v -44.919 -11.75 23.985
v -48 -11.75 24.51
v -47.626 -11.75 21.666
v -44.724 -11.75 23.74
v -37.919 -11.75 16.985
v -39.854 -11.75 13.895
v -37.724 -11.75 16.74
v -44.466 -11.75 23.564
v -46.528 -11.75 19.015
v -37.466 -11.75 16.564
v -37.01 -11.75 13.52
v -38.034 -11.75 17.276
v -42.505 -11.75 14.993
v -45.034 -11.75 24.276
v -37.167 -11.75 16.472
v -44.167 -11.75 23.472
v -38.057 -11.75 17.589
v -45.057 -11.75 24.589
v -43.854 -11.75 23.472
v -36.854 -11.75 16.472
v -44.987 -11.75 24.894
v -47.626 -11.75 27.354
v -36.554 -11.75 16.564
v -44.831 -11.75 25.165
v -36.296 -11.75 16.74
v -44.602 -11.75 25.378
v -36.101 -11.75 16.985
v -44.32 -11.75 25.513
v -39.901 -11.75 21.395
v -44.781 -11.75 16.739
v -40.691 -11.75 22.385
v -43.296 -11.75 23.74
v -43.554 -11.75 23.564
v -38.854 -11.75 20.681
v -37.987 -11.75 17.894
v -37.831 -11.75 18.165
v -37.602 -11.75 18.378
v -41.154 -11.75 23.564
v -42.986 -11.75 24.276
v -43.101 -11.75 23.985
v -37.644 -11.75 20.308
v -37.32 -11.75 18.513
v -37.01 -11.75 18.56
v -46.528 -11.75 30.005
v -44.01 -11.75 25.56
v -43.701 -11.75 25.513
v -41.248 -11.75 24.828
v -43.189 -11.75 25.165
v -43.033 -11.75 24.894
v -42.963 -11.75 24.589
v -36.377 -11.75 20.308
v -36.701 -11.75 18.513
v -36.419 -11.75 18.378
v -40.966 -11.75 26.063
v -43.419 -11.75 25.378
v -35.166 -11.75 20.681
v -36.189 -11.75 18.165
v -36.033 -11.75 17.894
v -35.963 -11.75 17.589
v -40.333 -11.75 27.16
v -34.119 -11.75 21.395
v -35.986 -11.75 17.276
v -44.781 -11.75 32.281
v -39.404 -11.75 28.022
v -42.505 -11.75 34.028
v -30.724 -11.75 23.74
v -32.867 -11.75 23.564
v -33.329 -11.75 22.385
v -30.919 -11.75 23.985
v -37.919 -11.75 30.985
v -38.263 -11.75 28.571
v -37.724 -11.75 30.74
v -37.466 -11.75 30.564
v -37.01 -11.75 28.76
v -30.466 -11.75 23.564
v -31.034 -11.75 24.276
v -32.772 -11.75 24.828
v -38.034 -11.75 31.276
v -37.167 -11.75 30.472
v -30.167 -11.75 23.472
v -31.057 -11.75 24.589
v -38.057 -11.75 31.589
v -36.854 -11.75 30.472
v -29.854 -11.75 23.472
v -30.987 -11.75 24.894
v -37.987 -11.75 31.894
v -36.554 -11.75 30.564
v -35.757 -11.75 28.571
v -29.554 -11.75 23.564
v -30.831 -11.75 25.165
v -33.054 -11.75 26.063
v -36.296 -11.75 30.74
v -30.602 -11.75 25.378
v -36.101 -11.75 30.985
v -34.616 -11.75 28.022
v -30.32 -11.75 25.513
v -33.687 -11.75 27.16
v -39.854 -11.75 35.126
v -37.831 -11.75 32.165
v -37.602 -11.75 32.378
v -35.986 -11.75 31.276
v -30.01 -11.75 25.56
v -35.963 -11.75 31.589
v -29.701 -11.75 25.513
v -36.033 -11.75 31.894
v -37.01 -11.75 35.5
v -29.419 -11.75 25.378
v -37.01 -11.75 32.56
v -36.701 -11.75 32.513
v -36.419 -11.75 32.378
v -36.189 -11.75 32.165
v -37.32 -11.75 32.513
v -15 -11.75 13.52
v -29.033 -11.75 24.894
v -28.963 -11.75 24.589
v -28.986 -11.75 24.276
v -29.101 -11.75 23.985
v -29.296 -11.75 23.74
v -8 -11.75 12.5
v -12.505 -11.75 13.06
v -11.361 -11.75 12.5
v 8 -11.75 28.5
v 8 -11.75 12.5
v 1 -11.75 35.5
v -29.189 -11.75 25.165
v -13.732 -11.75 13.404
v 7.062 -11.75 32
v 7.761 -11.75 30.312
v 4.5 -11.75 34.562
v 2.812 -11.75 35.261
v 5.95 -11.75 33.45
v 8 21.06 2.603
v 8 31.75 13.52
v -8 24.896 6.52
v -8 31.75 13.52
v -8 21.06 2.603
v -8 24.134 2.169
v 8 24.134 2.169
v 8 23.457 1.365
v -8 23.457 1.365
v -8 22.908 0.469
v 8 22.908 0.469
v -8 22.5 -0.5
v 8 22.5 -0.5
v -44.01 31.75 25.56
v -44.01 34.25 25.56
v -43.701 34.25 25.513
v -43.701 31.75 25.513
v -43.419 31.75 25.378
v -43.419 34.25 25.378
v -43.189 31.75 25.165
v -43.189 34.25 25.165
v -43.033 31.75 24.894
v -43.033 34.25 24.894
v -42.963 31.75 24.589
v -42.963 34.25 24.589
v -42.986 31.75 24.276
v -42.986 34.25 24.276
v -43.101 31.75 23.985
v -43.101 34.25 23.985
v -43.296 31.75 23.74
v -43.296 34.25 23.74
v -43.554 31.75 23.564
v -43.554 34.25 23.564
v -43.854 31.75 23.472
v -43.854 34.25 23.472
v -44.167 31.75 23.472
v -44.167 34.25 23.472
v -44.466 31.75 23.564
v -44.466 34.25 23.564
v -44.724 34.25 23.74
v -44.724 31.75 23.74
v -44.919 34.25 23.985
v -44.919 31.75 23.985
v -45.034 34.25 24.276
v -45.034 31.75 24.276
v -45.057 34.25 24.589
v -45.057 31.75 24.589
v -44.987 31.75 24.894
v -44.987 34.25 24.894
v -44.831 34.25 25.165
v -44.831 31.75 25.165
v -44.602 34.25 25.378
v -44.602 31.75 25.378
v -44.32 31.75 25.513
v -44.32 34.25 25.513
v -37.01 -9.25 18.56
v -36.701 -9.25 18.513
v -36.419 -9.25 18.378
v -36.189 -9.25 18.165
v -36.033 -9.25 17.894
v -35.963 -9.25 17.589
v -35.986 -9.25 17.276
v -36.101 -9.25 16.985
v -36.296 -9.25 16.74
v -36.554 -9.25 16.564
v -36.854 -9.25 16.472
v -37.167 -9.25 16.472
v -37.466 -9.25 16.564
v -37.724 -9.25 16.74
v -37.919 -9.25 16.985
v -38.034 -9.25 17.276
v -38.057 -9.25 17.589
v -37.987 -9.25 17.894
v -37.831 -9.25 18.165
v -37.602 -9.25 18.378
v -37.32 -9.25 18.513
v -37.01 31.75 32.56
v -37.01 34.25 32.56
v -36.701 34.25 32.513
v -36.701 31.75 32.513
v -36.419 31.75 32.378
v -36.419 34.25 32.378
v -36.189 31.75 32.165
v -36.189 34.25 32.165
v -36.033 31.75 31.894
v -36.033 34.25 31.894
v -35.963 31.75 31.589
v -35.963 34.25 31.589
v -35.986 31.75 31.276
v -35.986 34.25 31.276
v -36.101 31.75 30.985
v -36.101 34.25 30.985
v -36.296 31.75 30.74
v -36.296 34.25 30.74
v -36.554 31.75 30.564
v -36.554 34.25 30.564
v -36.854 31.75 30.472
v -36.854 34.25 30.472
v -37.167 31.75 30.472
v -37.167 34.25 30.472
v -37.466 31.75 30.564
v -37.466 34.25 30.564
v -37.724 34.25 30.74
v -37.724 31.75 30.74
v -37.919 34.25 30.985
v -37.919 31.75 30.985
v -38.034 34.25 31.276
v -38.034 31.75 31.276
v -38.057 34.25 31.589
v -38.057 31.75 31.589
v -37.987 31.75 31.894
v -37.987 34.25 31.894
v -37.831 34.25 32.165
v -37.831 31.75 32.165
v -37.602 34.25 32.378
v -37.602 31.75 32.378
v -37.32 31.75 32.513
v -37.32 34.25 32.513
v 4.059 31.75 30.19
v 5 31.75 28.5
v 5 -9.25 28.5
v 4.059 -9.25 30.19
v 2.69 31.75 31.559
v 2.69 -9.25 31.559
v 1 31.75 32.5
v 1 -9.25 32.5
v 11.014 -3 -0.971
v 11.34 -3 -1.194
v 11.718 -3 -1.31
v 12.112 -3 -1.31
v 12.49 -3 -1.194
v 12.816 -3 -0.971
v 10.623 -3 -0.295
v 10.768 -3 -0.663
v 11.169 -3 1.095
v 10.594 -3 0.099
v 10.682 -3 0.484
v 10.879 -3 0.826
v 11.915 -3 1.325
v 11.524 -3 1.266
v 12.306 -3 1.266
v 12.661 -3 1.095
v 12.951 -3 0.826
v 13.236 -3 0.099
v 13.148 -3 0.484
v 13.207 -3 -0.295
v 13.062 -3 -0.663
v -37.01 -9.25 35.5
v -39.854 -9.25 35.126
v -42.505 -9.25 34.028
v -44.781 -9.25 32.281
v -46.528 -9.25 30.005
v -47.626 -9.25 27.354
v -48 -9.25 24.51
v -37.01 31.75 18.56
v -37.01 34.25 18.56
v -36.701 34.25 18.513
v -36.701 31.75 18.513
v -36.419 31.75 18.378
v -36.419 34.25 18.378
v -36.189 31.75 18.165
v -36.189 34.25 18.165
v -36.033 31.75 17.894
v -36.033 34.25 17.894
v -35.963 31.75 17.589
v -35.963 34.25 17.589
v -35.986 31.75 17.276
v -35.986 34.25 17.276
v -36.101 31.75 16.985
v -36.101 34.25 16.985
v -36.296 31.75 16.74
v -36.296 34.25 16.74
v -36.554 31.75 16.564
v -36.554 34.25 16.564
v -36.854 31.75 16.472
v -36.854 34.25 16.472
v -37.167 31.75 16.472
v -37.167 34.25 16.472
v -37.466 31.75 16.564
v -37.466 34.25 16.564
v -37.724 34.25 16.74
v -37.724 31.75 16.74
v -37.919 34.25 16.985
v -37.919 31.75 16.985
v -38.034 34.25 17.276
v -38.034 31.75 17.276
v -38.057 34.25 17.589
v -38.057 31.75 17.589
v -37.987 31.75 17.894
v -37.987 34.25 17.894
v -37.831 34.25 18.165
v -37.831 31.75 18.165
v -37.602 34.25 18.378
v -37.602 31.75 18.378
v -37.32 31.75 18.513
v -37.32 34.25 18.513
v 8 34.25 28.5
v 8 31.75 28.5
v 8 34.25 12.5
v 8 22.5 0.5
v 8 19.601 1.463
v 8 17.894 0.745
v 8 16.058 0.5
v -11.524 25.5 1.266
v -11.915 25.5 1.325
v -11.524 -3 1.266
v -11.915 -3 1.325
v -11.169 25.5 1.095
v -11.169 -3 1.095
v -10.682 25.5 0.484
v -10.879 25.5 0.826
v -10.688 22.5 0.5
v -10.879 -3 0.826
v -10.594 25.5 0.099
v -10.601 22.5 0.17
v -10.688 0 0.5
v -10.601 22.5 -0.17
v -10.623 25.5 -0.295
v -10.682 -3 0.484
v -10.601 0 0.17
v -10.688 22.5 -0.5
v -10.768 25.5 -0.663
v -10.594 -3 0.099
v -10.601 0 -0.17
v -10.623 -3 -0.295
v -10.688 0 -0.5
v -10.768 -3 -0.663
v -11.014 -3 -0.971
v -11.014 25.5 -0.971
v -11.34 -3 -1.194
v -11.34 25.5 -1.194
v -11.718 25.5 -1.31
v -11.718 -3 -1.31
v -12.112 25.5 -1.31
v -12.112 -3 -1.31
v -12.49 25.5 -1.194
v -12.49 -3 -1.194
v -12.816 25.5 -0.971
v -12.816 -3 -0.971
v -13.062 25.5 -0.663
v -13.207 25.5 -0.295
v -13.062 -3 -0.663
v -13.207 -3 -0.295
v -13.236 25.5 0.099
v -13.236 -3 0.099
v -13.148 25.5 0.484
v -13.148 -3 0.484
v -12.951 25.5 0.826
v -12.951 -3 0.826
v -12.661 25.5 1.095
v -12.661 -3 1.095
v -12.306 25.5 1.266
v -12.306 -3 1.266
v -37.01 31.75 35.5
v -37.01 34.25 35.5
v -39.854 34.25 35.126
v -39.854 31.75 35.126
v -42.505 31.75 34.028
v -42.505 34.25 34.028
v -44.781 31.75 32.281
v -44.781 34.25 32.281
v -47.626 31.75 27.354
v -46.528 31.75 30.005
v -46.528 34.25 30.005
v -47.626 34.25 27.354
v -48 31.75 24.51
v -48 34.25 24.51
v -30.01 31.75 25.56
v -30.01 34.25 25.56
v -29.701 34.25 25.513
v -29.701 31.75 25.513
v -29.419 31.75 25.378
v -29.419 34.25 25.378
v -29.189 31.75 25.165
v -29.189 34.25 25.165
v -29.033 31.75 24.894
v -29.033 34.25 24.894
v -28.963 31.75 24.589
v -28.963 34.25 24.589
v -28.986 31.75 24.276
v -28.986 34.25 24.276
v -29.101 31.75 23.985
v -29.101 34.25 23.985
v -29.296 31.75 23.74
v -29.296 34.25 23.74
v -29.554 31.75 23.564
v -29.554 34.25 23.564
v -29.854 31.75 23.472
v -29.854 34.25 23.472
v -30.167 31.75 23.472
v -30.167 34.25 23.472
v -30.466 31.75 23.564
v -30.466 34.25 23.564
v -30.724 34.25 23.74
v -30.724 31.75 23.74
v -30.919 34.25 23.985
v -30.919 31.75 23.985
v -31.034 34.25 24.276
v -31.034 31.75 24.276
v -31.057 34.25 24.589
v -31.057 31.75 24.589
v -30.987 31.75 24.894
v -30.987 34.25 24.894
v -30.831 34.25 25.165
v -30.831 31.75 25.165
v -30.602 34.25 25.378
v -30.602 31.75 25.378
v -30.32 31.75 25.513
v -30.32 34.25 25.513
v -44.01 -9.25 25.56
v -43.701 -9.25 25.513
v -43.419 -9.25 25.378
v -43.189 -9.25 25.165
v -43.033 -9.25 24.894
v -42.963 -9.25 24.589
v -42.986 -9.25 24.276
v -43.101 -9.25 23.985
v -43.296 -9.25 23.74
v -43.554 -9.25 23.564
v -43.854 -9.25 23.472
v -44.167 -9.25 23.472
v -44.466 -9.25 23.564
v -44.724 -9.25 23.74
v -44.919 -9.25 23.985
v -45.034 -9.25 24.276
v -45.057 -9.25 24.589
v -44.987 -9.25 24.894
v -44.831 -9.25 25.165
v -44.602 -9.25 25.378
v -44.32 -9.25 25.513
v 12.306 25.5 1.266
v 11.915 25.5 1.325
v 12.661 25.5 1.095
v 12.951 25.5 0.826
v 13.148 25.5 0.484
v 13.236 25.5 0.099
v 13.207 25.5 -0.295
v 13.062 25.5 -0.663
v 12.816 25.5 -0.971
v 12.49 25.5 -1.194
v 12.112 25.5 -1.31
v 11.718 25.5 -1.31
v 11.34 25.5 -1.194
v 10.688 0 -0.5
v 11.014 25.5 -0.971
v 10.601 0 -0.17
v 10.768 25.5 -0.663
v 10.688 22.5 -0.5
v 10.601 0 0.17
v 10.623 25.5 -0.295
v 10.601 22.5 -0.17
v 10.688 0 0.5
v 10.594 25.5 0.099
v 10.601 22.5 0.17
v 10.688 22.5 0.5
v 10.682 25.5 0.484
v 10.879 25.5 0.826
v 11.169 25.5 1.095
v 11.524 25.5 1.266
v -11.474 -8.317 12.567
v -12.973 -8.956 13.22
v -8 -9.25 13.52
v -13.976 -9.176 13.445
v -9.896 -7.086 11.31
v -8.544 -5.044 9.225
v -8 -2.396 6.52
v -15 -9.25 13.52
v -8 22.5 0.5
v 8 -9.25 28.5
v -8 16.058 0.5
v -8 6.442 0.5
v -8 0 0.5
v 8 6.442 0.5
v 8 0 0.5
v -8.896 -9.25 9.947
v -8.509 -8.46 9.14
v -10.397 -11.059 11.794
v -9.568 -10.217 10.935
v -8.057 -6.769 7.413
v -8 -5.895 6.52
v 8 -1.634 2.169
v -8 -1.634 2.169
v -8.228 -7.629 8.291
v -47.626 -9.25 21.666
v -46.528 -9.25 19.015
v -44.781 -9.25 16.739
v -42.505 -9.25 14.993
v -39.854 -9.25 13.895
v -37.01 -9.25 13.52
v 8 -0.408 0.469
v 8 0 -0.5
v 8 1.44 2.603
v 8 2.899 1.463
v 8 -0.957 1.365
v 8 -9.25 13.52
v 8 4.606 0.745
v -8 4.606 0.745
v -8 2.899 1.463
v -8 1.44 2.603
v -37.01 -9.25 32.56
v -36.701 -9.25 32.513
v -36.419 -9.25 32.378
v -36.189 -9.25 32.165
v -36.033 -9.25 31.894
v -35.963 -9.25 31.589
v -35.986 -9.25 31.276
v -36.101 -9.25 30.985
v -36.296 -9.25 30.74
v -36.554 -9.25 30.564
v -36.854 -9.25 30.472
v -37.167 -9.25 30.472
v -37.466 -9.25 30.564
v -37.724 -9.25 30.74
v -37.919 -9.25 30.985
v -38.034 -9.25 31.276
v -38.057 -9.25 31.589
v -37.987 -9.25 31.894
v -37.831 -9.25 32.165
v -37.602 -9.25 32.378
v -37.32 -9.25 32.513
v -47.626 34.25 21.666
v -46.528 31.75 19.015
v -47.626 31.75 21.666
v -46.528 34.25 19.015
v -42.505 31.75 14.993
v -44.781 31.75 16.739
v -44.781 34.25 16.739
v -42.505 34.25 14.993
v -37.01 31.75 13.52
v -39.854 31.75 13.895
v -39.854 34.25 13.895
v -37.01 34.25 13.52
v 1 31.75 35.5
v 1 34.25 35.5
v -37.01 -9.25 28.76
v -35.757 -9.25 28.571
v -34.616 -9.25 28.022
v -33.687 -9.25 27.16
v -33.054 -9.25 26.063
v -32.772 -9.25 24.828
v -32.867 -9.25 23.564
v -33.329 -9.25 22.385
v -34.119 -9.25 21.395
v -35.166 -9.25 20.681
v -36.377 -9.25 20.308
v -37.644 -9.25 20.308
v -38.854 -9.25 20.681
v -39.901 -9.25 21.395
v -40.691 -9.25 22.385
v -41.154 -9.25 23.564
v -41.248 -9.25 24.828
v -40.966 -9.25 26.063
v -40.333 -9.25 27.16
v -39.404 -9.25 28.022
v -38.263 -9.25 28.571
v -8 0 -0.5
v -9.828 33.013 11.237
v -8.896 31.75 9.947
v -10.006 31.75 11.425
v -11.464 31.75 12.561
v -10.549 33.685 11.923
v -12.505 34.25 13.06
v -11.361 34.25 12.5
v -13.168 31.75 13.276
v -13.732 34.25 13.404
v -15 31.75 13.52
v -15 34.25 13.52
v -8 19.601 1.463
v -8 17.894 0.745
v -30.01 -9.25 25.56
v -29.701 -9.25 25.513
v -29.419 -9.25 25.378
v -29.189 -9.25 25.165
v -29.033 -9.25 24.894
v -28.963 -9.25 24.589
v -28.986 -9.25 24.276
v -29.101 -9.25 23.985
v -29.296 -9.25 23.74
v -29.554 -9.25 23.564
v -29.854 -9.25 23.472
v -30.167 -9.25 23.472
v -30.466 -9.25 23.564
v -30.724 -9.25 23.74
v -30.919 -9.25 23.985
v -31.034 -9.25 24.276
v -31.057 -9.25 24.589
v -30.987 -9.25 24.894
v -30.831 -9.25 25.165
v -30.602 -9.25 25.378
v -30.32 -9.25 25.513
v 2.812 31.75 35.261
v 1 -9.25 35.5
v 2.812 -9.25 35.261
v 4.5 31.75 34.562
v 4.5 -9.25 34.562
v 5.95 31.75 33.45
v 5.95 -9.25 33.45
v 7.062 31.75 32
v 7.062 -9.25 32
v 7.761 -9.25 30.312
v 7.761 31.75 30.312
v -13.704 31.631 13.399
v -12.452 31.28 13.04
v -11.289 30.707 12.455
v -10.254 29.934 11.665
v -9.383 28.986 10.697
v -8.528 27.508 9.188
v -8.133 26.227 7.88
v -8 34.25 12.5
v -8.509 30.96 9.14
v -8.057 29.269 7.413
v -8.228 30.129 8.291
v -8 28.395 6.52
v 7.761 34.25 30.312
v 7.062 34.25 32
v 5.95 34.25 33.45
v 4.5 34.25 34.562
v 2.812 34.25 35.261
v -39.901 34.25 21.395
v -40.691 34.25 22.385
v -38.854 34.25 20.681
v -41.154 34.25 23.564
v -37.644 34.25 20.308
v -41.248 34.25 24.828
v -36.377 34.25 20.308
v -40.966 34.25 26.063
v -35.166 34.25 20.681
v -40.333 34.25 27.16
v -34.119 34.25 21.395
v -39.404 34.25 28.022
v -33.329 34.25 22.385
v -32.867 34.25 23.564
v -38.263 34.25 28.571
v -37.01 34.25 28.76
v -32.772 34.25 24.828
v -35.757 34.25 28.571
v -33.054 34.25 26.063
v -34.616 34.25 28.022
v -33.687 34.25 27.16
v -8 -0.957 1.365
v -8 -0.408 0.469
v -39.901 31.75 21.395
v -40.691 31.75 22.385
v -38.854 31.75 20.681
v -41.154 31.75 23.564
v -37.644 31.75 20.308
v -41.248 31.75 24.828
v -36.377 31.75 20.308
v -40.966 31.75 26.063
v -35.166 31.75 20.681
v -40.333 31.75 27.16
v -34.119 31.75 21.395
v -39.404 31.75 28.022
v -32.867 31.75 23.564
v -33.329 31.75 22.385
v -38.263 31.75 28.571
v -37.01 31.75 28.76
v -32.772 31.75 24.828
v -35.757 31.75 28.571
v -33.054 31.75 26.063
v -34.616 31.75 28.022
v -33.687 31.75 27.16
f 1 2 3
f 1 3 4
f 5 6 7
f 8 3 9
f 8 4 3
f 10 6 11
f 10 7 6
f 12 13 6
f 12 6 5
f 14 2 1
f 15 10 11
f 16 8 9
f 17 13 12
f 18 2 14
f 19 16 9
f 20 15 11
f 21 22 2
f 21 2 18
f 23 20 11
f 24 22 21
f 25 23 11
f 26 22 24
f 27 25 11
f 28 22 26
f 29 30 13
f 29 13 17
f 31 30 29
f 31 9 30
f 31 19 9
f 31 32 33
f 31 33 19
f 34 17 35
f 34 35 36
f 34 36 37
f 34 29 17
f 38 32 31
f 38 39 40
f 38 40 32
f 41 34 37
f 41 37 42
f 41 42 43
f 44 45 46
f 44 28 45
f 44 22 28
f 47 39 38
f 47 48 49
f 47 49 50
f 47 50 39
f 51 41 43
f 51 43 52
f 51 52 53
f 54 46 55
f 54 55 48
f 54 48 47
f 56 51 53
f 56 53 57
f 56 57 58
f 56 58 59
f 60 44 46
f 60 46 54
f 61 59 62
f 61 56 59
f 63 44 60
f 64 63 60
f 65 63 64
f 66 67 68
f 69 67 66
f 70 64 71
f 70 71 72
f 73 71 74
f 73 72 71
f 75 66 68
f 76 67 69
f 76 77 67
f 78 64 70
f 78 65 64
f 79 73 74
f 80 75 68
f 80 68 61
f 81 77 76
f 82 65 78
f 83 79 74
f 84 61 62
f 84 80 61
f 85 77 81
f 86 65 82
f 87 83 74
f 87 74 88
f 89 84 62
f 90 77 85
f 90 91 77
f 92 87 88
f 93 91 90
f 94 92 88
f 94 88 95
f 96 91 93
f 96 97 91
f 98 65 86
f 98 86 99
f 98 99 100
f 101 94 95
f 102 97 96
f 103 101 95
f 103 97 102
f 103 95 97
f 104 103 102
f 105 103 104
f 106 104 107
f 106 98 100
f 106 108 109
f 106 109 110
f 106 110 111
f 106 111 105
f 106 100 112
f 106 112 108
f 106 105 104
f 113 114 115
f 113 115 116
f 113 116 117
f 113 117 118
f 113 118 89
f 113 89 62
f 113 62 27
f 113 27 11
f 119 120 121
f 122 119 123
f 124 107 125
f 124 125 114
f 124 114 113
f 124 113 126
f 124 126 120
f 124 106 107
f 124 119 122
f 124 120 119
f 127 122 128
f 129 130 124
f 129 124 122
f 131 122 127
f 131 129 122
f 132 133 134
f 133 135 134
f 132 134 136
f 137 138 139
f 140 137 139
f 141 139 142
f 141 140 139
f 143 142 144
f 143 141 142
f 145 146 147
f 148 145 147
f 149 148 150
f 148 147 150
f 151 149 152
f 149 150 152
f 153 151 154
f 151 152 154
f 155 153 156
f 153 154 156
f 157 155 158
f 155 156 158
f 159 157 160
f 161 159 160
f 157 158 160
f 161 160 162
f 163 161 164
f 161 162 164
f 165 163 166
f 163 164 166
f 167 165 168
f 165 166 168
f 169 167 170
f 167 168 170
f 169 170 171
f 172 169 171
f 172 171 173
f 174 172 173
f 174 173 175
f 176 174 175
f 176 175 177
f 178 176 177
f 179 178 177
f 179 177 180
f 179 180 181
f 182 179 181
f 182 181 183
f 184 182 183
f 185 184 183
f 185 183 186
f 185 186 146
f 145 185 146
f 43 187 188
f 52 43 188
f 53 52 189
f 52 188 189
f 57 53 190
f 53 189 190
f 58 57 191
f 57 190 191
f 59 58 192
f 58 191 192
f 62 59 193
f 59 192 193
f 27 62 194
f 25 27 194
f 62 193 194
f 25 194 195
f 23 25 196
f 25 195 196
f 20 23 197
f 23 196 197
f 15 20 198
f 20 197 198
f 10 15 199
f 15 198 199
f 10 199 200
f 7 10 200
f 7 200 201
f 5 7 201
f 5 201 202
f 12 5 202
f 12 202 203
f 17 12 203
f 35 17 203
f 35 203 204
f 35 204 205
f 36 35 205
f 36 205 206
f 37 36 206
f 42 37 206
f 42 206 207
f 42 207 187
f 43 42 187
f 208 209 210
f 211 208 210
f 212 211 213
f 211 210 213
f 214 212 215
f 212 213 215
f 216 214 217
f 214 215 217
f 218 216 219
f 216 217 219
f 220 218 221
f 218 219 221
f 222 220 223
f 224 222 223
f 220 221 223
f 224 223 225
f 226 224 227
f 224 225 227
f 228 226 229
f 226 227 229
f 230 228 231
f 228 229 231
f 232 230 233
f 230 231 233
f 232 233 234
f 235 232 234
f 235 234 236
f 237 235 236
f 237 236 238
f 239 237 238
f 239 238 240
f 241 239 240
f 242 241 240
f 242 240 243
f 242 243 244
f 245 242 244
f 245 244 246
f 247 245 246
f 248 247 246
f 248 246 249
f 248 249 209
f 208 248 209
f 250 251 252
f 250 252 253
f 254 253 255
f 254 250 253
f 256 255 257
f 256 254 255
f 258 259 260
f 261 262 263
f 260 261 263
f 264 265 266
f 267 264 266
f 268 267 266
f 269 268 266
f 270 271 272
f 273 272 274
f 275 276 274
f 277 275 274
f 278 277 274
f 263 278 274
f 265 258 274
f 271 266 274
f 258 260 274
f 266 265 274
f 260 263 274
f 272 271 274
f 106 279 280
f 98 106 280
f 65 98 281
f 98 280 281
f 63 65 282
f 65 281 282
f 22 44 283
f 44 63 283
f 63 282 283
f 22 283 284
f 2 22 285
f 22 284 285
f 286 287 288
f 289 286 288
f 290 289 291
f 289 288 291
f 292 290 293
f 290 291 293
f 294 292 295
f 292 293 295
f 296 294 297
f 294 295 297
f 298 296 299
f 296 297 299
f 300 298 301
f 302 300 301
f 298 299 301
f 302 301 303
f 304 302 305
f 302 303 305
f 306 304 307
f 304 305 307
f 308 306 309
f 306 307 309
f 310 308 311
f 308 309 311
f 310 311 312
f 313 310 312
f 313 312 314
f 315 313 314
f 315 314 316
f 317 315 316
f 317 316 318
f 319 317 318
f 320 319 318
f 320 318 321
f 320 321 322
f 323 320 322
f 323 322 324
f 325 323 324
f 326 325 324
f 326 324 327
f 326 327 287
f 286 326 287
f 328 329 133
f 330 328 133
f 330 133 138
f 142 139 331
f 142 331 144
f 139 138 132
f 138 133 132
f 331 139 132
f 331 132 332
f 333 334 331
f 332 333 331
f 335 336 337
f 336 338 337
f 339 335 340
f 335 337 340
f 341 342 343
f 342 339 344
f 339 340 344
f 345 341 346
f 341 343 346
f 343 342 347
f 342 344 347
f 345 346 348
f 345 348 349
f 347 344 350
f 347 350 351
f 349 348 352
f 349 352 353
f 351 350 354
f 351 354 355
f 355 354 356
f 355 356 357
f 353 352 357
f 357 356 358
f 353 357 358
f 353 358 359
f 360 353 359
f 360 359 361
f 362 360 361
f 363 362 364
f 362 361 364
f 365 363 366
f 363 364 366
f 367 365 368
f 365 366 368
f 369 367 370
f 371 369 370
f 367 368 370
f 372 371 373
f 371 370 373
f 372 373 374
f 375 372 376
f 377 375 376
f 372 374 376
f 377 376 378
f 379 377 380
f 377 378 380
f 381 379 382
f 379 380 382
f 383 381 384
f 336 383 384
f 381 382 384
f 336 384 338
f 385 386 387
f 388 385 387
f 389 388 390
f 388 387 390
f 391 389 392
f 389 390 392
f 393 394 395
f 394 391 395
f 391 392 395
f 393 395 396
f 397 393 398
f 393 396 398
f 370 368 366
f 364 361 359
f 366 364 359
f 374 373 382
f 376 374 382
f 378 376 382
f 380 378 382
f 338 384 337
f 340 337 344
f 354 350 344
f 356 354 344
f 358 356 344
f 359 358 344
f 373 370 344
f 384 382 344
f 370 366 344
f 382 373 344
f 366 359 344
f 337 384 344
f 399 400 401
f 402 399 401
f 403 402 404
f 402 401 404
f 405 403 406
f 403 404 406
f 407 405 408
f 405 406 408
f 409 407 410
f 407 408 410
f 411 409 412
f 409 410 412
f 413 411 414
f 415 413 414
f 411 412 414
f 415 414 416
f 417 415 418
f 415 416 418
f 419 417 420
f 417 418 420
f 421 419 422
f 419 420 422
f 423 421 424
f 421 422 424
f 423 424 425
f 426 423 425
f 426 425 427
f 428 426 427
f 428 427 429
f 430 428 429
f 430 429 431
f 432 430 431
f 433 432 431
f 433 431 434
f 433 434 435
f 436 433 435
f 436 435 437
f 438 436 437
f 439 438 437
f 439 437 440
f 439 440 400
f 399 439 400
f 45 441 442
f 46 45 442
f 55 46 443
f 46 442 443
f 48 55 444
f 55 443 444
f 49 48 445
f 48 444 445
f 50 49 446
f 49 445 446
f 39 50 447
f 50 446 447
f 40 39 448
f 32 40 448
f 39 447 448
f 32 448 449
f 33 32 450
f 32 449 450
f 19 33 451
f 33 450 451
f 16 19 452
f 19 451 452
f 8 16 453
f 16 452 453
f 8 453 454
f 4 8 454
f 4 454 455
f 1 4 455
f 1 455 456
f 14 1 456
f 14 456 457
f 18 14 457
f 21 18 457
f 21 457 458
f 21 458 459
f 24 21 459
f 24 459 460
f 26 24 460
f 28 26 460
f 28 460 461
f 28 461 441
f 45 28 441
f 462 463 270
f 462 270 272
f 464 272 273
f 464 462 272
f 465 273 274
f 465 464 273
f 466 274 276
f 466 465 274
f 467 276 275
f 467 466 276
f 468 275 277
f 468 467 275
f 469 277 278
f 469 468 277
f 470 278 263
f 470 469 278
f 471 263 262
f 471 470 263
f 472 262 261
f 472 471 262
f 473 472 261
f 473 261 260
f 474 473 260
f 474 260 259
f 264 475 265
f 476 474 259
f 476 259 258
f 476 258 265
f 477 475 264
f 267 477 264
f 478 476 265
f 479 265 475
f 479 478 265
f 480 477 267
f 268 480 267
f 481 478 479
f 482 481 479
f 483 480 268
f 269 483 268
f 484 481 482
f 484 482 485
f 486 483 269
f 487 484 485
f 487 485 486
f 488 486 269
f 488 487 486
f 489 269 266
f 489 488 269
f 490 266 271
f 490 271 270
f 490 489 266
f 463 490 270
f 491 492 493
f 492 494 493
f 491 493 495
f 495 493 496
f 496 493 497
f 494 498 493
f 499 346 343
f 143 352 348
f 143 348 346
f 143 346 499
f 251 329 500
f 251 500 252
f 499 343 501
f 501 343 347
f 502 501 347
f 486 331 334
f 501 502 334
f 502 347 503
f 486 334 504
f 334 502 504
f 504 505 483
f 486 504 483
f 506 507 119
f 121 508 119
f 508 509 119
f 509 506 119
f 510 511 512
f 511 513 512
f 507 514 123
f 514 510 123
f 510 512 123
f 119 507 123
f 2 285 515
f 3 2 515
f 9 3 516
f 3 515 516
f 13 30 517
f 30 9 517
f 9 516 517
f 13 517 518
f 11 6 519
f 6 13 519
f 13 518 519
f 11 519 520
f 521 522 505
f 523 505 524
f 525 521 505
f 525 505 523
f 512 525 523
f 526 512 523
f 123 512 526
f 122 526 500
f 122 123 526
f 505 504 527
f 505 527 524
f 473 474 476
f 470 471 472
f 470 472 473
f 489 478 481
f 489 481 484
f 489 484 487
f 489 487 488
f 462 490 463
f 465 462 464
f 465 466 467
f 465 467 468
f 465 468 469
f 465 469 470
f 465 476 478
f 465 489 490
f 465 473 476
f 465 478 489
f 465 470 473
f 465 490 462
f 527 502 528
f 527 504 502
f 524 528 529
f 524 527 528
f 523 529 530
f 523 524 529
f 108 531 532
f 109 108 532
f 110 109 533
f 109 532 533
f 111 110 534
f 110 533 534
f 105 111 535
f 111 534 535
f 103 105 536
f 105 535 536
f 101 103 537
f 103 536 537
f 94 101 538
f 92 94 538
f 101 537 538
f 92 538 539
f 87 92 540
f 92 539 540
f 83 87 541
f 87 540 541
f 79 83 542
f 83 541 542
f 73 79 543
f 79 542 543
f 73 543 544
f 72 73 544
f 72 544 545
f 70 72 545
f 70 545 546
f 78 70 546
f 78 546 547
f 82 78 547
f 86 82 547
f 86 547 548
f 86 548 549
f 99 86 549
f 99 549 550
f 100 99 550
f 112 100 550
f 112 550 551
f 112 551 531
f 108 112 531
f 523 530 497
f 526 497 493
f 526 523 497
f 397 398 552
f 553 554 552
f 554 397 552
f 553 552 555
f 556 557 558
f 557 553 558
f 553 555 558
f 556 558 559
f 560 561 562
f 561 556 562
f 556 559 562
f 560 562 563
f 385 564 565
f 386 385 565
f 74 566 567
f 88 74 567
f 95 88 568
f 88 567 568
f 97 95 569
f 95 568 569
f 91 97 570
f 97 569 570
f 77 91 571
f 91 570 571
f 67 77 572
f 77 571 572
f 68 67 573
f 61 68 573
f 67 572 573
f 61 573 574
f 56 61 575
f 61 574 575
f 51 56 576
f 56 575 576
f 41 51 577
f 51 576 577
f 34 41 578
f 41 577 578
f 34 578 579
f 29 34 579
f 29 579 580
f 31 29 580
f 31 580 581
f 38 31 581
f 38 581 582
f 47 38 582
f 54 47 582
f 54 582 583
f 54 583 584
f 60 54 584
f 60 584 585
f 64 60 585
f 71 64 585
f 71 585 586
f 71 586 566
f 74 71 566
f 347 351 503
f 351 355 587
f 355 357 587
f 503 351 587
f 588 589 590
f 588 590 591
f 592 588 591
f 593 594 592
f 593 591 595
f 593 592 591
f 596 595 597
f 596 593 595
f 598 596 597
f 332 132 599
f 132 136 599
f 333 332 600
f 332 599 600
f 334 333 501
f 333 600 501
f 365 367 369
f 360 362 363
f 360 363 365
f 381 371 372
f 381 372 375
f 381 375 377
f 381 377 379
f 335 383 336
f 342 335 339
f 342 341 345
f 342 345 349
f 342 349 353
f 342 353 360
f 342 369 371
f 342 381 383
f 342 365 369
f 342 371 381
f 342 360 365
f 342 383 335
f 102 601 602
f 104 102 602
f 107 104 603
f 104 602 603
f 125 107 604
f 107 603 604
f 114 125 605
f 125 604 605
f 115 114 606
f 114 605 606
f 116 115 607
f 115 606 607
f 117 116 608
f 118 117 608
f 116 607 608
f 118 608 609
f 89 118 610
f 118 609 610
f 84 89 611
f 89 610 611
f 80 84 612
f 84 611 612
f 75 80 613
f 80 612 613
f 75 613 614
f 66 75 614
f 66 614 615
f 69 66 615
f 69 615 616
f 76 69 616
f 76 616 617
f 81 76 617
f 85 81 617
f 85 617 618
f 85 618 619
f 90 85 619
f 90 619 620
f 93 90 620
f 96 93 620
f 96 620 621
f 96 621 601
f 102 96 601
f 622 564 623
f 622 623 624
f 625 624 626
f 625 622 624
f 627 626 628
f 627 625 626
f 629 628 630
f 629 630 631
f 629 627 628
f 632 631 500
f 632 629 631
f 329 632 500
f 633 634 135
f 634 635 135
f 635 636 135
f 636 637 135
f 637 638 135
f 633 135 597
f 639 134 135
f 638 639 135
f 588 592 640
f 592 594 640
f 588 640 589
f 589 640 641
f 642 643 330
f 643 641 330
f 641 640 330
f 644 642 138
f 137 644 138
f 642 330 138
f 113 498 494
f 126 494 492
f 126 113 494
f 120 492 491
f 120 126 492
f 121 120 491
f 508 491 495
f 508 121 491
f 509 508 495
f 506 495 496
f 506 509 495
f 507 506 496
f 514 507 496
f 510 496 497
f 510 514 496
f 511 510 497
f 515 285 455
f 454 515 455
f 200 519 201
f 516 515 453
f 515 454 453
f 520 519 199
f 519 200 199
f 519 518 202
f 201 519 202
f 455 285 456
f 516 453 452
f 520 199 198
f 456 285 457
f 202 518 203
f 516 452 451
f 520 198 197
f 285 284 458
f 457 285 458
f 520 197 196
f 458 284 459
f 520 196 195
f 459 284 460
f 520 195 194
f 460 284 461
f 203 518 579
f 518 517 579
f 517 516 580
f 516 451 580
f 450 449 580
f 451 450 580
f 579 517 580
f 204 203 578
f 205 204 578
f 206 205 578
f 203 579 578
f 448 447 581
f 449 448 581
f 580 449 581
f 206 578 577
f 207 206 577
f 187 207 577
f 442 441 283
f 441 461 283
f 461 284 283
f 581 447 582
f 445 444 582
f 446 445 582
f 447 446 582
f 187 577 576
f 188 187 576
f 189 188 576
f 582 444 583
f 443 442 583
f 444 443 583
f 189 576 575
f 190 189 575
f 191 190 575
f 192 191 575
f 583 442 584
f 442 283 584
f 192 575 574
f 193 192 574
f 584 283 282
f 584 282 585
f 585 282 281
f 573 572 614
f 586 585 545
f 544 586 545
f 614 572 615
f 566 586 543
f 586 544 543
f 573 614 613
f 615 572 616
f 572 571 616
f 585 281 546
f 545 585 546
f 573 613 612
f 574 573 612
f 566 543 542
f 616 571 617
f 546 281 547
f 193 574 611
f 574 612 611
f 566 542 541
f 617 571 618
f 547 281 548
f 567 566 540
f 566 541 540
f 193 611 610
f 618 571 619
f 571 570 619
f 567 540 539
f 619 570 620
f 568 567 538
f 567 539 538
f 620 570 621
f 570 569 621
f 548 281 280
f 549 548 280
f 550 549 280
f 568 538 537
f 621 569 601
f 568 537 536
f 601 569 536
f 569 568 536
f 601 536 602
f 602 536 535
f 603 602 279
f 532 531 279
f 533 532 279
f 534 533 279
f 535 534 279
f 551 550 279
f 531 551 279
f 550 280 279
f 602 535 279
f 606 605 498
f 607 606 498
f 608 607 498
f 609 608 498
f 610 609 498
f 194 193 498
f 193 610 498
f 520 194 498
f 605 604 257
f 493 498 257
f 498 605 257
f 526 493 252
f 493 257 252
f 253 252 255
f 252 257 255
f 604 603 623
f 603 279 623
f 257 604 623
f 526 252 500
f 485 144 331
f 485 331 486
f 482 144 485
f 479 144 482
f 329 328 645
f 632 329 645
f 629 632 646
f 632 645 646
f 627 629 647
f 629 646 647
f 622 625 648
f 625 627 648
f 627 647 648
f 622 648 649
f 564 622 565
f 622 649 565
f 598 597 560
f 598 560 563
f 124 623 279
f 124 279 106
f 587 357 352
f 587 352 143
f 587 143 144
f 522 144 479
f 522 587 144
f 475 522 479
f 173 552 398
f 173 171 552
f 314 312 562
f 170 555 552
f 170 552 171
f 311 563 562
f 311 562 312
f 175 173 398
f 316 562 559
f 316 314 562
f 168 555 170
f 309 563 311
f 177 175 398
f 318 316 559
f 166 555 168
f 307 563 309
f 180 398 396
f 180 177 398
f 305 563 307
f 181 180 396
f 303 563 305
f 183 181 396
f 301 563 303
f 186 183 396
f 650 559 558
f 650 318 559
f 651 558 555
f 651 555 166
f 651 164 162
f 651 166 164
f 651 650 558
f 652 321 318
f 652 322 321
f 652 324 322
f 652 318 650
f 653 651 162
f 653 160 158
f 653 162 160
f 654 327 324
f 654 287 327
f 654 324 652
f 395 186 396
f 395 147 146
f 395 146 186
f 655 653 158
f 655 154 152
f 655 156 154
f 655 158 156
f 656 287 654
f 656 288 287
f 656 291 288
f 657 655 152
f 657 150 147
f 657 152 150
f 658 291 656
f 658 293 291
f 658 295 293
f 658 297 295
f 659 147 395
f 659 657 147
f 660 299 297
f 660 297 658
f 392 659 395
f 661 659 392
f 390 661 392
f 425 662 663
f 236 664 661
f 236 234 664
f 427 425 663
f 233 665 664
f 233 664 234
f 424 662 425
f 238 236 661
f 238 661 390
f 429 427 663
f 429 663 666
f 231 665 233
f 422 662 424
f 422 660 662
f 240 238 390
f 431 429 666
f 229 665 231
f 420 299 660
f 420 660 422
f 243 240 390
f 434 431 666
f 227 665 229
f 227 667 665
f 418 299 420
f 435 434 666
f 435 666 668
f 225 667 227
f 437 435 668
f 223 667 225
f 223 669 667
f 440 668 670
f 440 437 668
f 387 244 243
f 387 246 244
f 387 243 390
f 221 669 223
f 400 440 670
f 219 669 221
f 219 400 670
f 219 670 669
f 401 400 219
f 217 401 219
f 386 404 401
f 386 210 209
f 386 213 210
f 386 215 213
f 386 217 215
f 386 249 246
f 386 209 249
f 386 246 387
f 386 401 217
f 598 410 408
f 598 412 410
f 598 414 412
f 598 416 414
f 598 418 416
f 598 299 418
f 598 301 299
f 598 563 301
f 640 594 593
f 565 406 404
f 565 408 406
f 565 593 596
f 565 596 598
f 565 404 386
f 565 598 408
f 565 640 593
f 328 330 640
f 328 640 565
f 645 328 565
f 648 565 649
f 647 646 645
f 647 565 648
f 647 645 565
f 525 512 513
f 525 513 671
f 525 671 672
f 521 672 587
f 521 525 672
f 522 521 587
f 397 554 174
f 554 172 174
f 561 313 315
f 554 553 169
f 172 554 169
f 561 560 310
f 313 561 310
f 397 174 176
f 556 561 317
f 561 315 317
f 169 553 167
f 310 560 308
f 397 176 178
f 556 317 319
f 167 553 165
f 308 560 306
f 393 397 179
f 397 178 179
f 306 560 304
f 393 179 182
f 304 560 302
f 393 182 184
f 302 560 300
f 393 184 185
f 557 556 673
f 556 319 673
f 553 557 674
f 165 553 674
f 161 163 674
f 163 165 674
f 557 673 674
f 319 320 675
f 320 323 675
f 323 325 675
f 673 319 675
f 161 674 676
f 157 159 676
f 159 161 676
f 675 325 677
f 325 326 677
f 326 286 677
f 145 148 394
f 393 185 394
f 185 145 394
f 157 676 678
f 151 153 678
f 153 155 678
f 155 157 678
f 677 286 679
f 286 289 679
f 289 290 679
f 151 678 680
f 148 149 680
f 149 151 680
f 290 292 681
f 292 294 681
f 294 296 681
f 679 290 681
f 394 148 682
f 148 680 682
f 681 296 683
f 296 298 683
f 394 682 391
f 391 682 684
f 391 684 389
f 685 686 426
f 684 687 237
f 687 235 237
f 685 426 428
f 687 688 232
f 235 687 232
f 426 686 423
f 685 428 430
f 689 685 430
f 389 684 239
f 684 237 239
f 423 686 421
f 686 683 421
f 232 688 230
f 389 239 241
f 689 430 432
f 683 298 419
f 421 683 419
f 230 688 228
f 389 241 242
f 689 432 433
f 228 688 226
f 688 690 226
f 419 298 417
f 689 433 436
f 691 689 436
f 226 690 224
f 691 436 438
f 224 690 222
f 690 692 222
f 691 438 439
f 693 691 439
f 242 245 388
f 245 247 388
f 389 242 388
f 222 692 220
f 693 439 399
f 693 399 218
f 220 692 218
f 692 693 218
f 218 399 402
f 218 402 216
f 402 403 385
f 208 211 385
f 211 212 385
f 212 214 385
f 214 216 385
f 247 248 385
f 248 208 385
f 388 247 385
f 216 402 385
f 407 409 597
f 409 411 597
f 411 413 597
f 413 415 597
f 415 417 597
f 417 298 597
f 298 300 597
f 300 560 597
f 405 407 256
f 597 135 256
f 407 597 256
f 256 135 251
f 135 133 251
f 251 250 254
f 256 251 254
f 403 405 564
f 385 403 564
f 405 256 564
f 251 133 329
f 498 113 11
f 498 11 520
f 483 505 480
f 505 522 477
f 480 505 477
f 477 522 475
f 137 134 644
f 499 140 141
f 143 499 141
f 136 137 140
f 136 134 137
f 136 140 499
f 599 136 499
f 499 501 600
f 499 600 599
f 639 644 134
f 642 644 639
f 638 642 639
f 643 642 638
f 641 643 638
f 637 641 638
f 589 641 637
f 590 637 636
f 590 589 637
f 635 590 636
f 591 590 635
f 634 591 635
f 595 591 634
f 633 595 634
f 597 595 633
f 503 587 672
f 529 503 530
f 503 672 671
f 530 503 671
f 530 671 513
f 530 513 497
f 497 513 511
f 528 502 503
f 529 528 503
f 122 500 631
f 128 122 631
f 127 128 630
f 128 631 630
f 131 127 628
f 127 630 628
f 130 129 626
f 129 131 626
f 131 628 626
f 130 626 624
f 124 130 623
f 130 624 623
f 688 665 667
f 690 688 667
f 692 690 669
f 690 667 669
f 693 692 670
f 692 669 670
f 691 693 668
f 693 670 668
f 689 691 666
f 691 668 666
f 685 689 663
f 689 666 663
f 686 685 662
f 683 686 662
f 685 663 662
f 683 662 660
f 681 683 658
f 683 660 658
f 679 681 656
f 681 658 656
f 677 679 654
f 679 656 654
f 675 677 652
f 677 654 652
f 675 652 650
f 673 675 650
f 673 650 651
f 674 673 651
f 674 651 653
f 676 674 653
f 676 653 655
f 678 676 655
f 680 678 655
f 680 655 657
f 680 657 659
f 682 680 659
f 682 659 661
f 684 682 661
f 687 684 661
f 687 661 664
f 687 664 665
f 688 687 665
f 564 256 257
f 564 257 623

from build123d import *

# Parameters (mm, degrees)
SKETCH1_W           = 23.83
SKETCH1_H           = 1
BOSS_EXTRUDE1_DEPTH = 22.5
SKETCH2_R           = 1.325
BOSS_EXTRUDE2_DEPTH = 14.25
BOSS_EXTRUDE4_DEPTH = 8
SKETCH5_W           = 21.979847568
SKETCH5_H           = 2.5
BOSS_EXTRUDE5_DEPTH = 40
SKETCH6_R           = 4.25
SKETCH6_R_2         = 1.05
CUT_EXTRUDE1_DEPTH  = 76.367433285
FILLET1_R           = 7
FILLET2_R           = 7
FILLET3_R           = 7
BOSS_EXTRUDE6_START = 41
BOSS_EXTRUDE6_DEPTH = 41


with BuildPart() as part:
    # Sketch1 → Boss-Extrude1 (new body)
    with BuildSketch(Plane(origin=(0, 0, 0), x_dir=(1, 0, 0), z_dir=(0, 1, 0))):
        Rectangle(SKETCH1_W, SKETCH1_H)
    extrude(amount=BOSS_EXTRUDE1_DEPTH)

    # Sketch2 → Boss-Extrude2 (add, symmetric)
    with BuildSketch(Plane(origin=(0, 11.25, 0), x_dir=(1, 0, 0), z_dir=(0, 1, 0))):
        with Locations(Location((-11.915, 0, 0), (0, 0, 270))):
            Circle(SKETCH2_R)
        with Locations(Location((11.915, 0, 0), (0, 0, 270))):
            Circle(SKETCH2_R)
    extrude(amount=BOSS_EXTRUDE2_DEPTH, both=True)

    # Sketch4 → Boss-Extrude4 (add, symmetric)
    with BuildSketch(Plane(origin=(0, 0, 0), x_dir=(0, 0, -1), z_dir=(1, 0, 0))):
        Polygon((-0.5, 19.001100744), (-0.5, 22.5), (-12.5, 34.25), (-35.5, 34.25), (-35.5, 31.75), (-13.520152432, 31.75), align=None)
        Polygon((-0.5, 0), (-0.5, 3.498899256), (-13.520152432, -9.25), (-35.5, -9.25), (-35.5, -11.75), (-12.5, -11.75), align=None)
    extrude(amount=BOSS_EXTRUDE4_DEPTH, both=True)

    # Sketch5 → Boss-Extrude5 (add)
    with BuildSketch(Plane.ZY.offset(8)):
        with Locations((24.510076216, 33)):
            Rectangle(SKETCH5_W, SKETCH5_H)
        with Locations((24.510076216, -10.5)):
            Rectangle(SKETCH5_W, SKETCH5_H)
    extrude(amount=BOSS_EXTRUDE5_DEPTH)

    # Sketch6 → Cut-Extrude1 (cut, through all)
    with BuildSketch(Plane(origin=(0, 34.25, 0), x_dir=(1, 0, 0), z_dir=(0, 1, 0))):
        with Locations(Location((-37.010076216, -24.510076216, 0), (0, 0, 270))):
            Circle(SKETCH6_R)
        with Locations(Location((-44.010076216, -24.510076216, 0), (0, 0, 270))):
            Circle(SKETCH6_R_2)
        with Locations(Location((-37.010076216, -17.510076216, 0), (0, 0, 270))):
            Circle(SKETCH6_R_2)
        with Locations(Location((-30.010076216, -24.510076216, 0), (0, 0, 270))):
            Circle(SKETCH6_R_2)
        with Locations(Location((-37.010076216, -31.510076216, 0), (0, 0, 270))):
            Circle(SKETCH6_R_2)
        with BuildLine():
            ThreePointArc((-48, -24.510076216), (-44.781125848, -16.739026584), (-37.010076216, -13.520152432))
            Line((-37.010076216, -13.520152432), (-48, -13.520152432))
            Line((-48, -13.520152432), (-48, -24.510076216))
        make_face()
        with BuildLine():
            ThreePointArc((-37.010076216, -35.5), (-44.781125848, -32.281125848), (-48, -24.510076216))
            Line((-48, -24.510076216), (-48, -35.5))
            Line((-48, -35.5), (-37.010076216, -35.5))
        make_face()
    extrude(amount=-CUT_EXTRUDE1_DEPTH, mode=Mode.SUBTRACT)

    # Fillet1
    # the kernel refuses this fillet: 7 mm, written as the material it adds along each edge
    with BuildSketch(Plane(origin=(-8, -11.75, 13.520152432), x_dir=(-1, 0, 0), z_dir=(0, 1, 0))) as fillet1_piece_1_section:
        with BuildLine():
            CenterArc((FILLET1_R, -FILLET1_R), FILLET1_R, 90, 90)
            Line((0, -FILLET1_R), (0, 0))
            Line((0, 0), (FILLET1_R, 0))
        make_face()
    fillet1_piece_1 = extrude(amount=2.5, mode=Mode.PRIVATE)
    fillet1_piece_1 = split(fillet1_piece_1, bisect_by=Plane(origin=(-10.011124011, -11.168341556, 11.905965844), z_dir=(0, 0.7145104264934944, 0.699624792608213)), keep=Keep.TOP, mode=Mode.PRIVATE)
    fillet1_piece_1 = split(fillet1_piece_1, bisect_by=Plane(origin=(-10.011124011, -9.382065489, 13.655027826), z_dir=(0, -0.7145104264934944, -0.6996247926082129)), keep=Keep.TOP, mode=Mode.PRIVATE)
    add(fillet1_piece_1)
    with BuildSketch(Plane(origin=(-8, -11.75, 13.520152432), x_dir=(-1, 0, 0), z_dir=(0, 1, 0))) as fillet1_piece_2_section:
        with BuildLine():
            CenterArc((FILLET1_R, -FILLET1_R), FILLET1_R, 90, 90)
            Line((0, -FILLET1_R), (0, 0))
            Line((0, 0), (FILLET1_R, 0))
        make_face()
    fillet1_piece_2 = extrude(amount=20, mode=Mode.PRIVATE)
    fillet1_piece_2 = split(fillet1_piece_2, bisect_by=Plane(origin=(-8.808469458, -8.892227761, 9.581424097), z_dir=(0, 0.7145104264934944, 0.699624792608213)), keep=Keep.TOP, mode=Mode.PRIVATE)
    fillet1_piece_2 = split(fillet1_piece_2, bisect_by=Plane(origin=(-8.808469458, -9.25, 10.72673952), z_dir=(0, 1, 0)), keep=Keep.TOP, mode=Mode.PRIVATE)
    fillet1_piece_2 = split(fillet1_piece_2, bisect_by=Plane(origin=(-8.808469458, -7.105951695, 11.330486078), z_dir=(0, -0.7145104264934944, -0.6996247926082129)), keep=Keep.TOP, mode=Mode.PRIVATE)
    add(fillet1_piece_2)
    with BuildSketch(Plane(origin=(-8, 34.25, 13.520152432), x_dir=(0, 0, -1), z_dir=(0, -1, 0))) as fillet1_piece_3_section:
        with BuildLine():
            CenterArc((FILLET1_R, -FILLET1_R), FILLET1_R, 90, 90)
            Line((0, -FILLET1_R), (0, 0))
            Line((0, 0), (FILLET1_R, 0))
        make_face()
    fillet1_piece_3 = extrude(amount=2.5, mode=Mode.PRIVATE)
    fillet1_piece_3 = split(fillet1_piece_3, bisect_by=Plane(origin=(-10.011124011, 31.882065489, 13.655027826), z_dir=(0, 0.7145104264934944, -0.6996247926082129)), keep=Keep.TOP, mode=Mode.PRIVATE)
    fillet1_piece_3 = split(fillet1_piece_3, bisect_by=Plane(origin=(-10.011124011, 33.668341556, 11.905965844), z_dir=(0, -0.7145104264934944, 0.699624792608213)), keep=Keep.TOP, mode=Mode.PRIVATE)
    add(fillet1_piece_3)
    with BuildSketch(Plane(origin=(-8, 34.25, 13.520152432), x_dir=(0, 0, -1), z_dir=(0, -1, 0))) as fillet1_piece_4_section:
        with BuildLine():
            CenterArc((FILLET1_R, -FILLET1_R), FILLET1_R, 90, 90)
            Line((0, -FILLET1_R), (0, 0))
            Line((0, 0), (FILLET1_R, 0))
        make_face()
    fillet1_piece_4 = extrude(amount=20, mode=Mode.PRIVATE)
    fillet1_piece_4 = split(fillet1_piece_4, bisect_by=Plane(origin=(-8.808469465, 29.605951697, 11.33048608), z_dir=(0, 0.7145104264934944, -0.6996247926082129)), keep=Keep.TOP, mode=Mode.PRIVATE)
    fillet1_piece_4 = split(fillet1_piece_4, bisect_by=Plane(origin=(-8.808469465, 31.392227764, 9.581424099), z_dir=(0, -0.7145104264934944, 0.699624792608213)), keep=Keep.TOP, mode=Mode.PRIVATE)
    fillet1_piece_4 = split(fillet1_piece_4, bisect_by=Plane(origin=(-8.808469465, 31.75, 10.726739522), z_dir=(0, -1, 0)), keep=Keep.TOP, mode=Mode.PRIVATE)
    add(fillet1_piece_4)
    # the kernel refuses this fillet: 7 mm, written as the material it takes off along each edge
    with BuildSketch(Plane(origin=(8, 8.25, 35.5), x_dir=(0, 0, -1), z_dir=(0, -1, 0))) as fillet1_2_piece_1:
        with BuildLine():
            CenterArc((FILLET1_R, -FILLET1_R), FILLET1_R, 90, 90)
            Line((0, -FILLET1_R), (0, 0))
            Line((0, 0), (FILLET1_R, 0))
        make_face()
    extrude(amount=37.5, mode=Mode.SUBTRACT)
    with BuildSketch(Plane(origin=(8, 51.75, 35.5), x_dir=(-1, 0, 0), z_dir=(0, -1, 0))) as fillet1_2_piece_2:
        with BuildLine():
            CenterArc((FILLET1_R, FILLET1_R), FILLET1_R, 180, 90)
            Line((0, FILLET1_R), (0, 0))
            Line((0, 0), (FILLET1_R, 0))
        make_face()
    extrude(amount=37.5, mode=Mode.SUBTRACT)

    # Fillet2
    fillet2_edges = [part.edges().sort_by_distance(p)[0] for p in [
        (0, 19.001100744, 0.5),
        (0, 3.498899256, 0.5),
    ]]
    fillet(fillet2_edges, radius=FILLET2_R)

    # Fillet3
    # the kernel refuses this fillet: 7 mm, written as the material it adds along each edge
    with BuildSketch(Plane(origin=(-8, 22.5, 0.5), x_dir=(0, 0.6996247926074847, 0.7145104264942074), z_dir=(1, 0, 0))) as fillet3_piece_1:
        with BuildLine():
            CenterArc((2.335944006, -7), FILLET3_R, 90, 25.834886249)
            Line((-0.714510426, -0.699624793), (0, 0))
            Line((0, 0), (2.335944006, 0))
        make_face()
    extrude(amount=16)
    with BuildSketch(Plane(origin=(8, 0, 0.5), x_dir=(0, 0, -1), z_dir=(-1, 0, 0))) as fillet3_piece_2:
        with BuildLine():
            CenterArc((3.2283172, 6.635857326), FILLET3_R, 225.603091194, 25.834886249)
            Line((-1.669056348, 1.634284341), (0, 0))
            Line((0, 0), (1, 0))
        make_face()
    extrude(amount=16)

    # Sketch8 → Boss-Extrude6 (add)
    with BuildSketch(Plane(origin=(0, -9.25, 0), x_dir=(1, 0, 0), z_dir=(0, 1, 0)).offset(BOSS_EXTRUDE6_START)):
        with BuildLine():
            ThreePointArc((1, -35.5), (5.949747468, -33.449747468), (8, -28.5))
            Line((8, -28.5), (5, -28.5))
            ThreePointArc((5, -28.5), (3.422054899, -30.922054899), (1, -32.5))
            Line((1, -32.5), (1, -35.5))
        make_face()
    extrude(amount=-BOSS_EXTRUDE6_DEPTH)


solid = part.part
